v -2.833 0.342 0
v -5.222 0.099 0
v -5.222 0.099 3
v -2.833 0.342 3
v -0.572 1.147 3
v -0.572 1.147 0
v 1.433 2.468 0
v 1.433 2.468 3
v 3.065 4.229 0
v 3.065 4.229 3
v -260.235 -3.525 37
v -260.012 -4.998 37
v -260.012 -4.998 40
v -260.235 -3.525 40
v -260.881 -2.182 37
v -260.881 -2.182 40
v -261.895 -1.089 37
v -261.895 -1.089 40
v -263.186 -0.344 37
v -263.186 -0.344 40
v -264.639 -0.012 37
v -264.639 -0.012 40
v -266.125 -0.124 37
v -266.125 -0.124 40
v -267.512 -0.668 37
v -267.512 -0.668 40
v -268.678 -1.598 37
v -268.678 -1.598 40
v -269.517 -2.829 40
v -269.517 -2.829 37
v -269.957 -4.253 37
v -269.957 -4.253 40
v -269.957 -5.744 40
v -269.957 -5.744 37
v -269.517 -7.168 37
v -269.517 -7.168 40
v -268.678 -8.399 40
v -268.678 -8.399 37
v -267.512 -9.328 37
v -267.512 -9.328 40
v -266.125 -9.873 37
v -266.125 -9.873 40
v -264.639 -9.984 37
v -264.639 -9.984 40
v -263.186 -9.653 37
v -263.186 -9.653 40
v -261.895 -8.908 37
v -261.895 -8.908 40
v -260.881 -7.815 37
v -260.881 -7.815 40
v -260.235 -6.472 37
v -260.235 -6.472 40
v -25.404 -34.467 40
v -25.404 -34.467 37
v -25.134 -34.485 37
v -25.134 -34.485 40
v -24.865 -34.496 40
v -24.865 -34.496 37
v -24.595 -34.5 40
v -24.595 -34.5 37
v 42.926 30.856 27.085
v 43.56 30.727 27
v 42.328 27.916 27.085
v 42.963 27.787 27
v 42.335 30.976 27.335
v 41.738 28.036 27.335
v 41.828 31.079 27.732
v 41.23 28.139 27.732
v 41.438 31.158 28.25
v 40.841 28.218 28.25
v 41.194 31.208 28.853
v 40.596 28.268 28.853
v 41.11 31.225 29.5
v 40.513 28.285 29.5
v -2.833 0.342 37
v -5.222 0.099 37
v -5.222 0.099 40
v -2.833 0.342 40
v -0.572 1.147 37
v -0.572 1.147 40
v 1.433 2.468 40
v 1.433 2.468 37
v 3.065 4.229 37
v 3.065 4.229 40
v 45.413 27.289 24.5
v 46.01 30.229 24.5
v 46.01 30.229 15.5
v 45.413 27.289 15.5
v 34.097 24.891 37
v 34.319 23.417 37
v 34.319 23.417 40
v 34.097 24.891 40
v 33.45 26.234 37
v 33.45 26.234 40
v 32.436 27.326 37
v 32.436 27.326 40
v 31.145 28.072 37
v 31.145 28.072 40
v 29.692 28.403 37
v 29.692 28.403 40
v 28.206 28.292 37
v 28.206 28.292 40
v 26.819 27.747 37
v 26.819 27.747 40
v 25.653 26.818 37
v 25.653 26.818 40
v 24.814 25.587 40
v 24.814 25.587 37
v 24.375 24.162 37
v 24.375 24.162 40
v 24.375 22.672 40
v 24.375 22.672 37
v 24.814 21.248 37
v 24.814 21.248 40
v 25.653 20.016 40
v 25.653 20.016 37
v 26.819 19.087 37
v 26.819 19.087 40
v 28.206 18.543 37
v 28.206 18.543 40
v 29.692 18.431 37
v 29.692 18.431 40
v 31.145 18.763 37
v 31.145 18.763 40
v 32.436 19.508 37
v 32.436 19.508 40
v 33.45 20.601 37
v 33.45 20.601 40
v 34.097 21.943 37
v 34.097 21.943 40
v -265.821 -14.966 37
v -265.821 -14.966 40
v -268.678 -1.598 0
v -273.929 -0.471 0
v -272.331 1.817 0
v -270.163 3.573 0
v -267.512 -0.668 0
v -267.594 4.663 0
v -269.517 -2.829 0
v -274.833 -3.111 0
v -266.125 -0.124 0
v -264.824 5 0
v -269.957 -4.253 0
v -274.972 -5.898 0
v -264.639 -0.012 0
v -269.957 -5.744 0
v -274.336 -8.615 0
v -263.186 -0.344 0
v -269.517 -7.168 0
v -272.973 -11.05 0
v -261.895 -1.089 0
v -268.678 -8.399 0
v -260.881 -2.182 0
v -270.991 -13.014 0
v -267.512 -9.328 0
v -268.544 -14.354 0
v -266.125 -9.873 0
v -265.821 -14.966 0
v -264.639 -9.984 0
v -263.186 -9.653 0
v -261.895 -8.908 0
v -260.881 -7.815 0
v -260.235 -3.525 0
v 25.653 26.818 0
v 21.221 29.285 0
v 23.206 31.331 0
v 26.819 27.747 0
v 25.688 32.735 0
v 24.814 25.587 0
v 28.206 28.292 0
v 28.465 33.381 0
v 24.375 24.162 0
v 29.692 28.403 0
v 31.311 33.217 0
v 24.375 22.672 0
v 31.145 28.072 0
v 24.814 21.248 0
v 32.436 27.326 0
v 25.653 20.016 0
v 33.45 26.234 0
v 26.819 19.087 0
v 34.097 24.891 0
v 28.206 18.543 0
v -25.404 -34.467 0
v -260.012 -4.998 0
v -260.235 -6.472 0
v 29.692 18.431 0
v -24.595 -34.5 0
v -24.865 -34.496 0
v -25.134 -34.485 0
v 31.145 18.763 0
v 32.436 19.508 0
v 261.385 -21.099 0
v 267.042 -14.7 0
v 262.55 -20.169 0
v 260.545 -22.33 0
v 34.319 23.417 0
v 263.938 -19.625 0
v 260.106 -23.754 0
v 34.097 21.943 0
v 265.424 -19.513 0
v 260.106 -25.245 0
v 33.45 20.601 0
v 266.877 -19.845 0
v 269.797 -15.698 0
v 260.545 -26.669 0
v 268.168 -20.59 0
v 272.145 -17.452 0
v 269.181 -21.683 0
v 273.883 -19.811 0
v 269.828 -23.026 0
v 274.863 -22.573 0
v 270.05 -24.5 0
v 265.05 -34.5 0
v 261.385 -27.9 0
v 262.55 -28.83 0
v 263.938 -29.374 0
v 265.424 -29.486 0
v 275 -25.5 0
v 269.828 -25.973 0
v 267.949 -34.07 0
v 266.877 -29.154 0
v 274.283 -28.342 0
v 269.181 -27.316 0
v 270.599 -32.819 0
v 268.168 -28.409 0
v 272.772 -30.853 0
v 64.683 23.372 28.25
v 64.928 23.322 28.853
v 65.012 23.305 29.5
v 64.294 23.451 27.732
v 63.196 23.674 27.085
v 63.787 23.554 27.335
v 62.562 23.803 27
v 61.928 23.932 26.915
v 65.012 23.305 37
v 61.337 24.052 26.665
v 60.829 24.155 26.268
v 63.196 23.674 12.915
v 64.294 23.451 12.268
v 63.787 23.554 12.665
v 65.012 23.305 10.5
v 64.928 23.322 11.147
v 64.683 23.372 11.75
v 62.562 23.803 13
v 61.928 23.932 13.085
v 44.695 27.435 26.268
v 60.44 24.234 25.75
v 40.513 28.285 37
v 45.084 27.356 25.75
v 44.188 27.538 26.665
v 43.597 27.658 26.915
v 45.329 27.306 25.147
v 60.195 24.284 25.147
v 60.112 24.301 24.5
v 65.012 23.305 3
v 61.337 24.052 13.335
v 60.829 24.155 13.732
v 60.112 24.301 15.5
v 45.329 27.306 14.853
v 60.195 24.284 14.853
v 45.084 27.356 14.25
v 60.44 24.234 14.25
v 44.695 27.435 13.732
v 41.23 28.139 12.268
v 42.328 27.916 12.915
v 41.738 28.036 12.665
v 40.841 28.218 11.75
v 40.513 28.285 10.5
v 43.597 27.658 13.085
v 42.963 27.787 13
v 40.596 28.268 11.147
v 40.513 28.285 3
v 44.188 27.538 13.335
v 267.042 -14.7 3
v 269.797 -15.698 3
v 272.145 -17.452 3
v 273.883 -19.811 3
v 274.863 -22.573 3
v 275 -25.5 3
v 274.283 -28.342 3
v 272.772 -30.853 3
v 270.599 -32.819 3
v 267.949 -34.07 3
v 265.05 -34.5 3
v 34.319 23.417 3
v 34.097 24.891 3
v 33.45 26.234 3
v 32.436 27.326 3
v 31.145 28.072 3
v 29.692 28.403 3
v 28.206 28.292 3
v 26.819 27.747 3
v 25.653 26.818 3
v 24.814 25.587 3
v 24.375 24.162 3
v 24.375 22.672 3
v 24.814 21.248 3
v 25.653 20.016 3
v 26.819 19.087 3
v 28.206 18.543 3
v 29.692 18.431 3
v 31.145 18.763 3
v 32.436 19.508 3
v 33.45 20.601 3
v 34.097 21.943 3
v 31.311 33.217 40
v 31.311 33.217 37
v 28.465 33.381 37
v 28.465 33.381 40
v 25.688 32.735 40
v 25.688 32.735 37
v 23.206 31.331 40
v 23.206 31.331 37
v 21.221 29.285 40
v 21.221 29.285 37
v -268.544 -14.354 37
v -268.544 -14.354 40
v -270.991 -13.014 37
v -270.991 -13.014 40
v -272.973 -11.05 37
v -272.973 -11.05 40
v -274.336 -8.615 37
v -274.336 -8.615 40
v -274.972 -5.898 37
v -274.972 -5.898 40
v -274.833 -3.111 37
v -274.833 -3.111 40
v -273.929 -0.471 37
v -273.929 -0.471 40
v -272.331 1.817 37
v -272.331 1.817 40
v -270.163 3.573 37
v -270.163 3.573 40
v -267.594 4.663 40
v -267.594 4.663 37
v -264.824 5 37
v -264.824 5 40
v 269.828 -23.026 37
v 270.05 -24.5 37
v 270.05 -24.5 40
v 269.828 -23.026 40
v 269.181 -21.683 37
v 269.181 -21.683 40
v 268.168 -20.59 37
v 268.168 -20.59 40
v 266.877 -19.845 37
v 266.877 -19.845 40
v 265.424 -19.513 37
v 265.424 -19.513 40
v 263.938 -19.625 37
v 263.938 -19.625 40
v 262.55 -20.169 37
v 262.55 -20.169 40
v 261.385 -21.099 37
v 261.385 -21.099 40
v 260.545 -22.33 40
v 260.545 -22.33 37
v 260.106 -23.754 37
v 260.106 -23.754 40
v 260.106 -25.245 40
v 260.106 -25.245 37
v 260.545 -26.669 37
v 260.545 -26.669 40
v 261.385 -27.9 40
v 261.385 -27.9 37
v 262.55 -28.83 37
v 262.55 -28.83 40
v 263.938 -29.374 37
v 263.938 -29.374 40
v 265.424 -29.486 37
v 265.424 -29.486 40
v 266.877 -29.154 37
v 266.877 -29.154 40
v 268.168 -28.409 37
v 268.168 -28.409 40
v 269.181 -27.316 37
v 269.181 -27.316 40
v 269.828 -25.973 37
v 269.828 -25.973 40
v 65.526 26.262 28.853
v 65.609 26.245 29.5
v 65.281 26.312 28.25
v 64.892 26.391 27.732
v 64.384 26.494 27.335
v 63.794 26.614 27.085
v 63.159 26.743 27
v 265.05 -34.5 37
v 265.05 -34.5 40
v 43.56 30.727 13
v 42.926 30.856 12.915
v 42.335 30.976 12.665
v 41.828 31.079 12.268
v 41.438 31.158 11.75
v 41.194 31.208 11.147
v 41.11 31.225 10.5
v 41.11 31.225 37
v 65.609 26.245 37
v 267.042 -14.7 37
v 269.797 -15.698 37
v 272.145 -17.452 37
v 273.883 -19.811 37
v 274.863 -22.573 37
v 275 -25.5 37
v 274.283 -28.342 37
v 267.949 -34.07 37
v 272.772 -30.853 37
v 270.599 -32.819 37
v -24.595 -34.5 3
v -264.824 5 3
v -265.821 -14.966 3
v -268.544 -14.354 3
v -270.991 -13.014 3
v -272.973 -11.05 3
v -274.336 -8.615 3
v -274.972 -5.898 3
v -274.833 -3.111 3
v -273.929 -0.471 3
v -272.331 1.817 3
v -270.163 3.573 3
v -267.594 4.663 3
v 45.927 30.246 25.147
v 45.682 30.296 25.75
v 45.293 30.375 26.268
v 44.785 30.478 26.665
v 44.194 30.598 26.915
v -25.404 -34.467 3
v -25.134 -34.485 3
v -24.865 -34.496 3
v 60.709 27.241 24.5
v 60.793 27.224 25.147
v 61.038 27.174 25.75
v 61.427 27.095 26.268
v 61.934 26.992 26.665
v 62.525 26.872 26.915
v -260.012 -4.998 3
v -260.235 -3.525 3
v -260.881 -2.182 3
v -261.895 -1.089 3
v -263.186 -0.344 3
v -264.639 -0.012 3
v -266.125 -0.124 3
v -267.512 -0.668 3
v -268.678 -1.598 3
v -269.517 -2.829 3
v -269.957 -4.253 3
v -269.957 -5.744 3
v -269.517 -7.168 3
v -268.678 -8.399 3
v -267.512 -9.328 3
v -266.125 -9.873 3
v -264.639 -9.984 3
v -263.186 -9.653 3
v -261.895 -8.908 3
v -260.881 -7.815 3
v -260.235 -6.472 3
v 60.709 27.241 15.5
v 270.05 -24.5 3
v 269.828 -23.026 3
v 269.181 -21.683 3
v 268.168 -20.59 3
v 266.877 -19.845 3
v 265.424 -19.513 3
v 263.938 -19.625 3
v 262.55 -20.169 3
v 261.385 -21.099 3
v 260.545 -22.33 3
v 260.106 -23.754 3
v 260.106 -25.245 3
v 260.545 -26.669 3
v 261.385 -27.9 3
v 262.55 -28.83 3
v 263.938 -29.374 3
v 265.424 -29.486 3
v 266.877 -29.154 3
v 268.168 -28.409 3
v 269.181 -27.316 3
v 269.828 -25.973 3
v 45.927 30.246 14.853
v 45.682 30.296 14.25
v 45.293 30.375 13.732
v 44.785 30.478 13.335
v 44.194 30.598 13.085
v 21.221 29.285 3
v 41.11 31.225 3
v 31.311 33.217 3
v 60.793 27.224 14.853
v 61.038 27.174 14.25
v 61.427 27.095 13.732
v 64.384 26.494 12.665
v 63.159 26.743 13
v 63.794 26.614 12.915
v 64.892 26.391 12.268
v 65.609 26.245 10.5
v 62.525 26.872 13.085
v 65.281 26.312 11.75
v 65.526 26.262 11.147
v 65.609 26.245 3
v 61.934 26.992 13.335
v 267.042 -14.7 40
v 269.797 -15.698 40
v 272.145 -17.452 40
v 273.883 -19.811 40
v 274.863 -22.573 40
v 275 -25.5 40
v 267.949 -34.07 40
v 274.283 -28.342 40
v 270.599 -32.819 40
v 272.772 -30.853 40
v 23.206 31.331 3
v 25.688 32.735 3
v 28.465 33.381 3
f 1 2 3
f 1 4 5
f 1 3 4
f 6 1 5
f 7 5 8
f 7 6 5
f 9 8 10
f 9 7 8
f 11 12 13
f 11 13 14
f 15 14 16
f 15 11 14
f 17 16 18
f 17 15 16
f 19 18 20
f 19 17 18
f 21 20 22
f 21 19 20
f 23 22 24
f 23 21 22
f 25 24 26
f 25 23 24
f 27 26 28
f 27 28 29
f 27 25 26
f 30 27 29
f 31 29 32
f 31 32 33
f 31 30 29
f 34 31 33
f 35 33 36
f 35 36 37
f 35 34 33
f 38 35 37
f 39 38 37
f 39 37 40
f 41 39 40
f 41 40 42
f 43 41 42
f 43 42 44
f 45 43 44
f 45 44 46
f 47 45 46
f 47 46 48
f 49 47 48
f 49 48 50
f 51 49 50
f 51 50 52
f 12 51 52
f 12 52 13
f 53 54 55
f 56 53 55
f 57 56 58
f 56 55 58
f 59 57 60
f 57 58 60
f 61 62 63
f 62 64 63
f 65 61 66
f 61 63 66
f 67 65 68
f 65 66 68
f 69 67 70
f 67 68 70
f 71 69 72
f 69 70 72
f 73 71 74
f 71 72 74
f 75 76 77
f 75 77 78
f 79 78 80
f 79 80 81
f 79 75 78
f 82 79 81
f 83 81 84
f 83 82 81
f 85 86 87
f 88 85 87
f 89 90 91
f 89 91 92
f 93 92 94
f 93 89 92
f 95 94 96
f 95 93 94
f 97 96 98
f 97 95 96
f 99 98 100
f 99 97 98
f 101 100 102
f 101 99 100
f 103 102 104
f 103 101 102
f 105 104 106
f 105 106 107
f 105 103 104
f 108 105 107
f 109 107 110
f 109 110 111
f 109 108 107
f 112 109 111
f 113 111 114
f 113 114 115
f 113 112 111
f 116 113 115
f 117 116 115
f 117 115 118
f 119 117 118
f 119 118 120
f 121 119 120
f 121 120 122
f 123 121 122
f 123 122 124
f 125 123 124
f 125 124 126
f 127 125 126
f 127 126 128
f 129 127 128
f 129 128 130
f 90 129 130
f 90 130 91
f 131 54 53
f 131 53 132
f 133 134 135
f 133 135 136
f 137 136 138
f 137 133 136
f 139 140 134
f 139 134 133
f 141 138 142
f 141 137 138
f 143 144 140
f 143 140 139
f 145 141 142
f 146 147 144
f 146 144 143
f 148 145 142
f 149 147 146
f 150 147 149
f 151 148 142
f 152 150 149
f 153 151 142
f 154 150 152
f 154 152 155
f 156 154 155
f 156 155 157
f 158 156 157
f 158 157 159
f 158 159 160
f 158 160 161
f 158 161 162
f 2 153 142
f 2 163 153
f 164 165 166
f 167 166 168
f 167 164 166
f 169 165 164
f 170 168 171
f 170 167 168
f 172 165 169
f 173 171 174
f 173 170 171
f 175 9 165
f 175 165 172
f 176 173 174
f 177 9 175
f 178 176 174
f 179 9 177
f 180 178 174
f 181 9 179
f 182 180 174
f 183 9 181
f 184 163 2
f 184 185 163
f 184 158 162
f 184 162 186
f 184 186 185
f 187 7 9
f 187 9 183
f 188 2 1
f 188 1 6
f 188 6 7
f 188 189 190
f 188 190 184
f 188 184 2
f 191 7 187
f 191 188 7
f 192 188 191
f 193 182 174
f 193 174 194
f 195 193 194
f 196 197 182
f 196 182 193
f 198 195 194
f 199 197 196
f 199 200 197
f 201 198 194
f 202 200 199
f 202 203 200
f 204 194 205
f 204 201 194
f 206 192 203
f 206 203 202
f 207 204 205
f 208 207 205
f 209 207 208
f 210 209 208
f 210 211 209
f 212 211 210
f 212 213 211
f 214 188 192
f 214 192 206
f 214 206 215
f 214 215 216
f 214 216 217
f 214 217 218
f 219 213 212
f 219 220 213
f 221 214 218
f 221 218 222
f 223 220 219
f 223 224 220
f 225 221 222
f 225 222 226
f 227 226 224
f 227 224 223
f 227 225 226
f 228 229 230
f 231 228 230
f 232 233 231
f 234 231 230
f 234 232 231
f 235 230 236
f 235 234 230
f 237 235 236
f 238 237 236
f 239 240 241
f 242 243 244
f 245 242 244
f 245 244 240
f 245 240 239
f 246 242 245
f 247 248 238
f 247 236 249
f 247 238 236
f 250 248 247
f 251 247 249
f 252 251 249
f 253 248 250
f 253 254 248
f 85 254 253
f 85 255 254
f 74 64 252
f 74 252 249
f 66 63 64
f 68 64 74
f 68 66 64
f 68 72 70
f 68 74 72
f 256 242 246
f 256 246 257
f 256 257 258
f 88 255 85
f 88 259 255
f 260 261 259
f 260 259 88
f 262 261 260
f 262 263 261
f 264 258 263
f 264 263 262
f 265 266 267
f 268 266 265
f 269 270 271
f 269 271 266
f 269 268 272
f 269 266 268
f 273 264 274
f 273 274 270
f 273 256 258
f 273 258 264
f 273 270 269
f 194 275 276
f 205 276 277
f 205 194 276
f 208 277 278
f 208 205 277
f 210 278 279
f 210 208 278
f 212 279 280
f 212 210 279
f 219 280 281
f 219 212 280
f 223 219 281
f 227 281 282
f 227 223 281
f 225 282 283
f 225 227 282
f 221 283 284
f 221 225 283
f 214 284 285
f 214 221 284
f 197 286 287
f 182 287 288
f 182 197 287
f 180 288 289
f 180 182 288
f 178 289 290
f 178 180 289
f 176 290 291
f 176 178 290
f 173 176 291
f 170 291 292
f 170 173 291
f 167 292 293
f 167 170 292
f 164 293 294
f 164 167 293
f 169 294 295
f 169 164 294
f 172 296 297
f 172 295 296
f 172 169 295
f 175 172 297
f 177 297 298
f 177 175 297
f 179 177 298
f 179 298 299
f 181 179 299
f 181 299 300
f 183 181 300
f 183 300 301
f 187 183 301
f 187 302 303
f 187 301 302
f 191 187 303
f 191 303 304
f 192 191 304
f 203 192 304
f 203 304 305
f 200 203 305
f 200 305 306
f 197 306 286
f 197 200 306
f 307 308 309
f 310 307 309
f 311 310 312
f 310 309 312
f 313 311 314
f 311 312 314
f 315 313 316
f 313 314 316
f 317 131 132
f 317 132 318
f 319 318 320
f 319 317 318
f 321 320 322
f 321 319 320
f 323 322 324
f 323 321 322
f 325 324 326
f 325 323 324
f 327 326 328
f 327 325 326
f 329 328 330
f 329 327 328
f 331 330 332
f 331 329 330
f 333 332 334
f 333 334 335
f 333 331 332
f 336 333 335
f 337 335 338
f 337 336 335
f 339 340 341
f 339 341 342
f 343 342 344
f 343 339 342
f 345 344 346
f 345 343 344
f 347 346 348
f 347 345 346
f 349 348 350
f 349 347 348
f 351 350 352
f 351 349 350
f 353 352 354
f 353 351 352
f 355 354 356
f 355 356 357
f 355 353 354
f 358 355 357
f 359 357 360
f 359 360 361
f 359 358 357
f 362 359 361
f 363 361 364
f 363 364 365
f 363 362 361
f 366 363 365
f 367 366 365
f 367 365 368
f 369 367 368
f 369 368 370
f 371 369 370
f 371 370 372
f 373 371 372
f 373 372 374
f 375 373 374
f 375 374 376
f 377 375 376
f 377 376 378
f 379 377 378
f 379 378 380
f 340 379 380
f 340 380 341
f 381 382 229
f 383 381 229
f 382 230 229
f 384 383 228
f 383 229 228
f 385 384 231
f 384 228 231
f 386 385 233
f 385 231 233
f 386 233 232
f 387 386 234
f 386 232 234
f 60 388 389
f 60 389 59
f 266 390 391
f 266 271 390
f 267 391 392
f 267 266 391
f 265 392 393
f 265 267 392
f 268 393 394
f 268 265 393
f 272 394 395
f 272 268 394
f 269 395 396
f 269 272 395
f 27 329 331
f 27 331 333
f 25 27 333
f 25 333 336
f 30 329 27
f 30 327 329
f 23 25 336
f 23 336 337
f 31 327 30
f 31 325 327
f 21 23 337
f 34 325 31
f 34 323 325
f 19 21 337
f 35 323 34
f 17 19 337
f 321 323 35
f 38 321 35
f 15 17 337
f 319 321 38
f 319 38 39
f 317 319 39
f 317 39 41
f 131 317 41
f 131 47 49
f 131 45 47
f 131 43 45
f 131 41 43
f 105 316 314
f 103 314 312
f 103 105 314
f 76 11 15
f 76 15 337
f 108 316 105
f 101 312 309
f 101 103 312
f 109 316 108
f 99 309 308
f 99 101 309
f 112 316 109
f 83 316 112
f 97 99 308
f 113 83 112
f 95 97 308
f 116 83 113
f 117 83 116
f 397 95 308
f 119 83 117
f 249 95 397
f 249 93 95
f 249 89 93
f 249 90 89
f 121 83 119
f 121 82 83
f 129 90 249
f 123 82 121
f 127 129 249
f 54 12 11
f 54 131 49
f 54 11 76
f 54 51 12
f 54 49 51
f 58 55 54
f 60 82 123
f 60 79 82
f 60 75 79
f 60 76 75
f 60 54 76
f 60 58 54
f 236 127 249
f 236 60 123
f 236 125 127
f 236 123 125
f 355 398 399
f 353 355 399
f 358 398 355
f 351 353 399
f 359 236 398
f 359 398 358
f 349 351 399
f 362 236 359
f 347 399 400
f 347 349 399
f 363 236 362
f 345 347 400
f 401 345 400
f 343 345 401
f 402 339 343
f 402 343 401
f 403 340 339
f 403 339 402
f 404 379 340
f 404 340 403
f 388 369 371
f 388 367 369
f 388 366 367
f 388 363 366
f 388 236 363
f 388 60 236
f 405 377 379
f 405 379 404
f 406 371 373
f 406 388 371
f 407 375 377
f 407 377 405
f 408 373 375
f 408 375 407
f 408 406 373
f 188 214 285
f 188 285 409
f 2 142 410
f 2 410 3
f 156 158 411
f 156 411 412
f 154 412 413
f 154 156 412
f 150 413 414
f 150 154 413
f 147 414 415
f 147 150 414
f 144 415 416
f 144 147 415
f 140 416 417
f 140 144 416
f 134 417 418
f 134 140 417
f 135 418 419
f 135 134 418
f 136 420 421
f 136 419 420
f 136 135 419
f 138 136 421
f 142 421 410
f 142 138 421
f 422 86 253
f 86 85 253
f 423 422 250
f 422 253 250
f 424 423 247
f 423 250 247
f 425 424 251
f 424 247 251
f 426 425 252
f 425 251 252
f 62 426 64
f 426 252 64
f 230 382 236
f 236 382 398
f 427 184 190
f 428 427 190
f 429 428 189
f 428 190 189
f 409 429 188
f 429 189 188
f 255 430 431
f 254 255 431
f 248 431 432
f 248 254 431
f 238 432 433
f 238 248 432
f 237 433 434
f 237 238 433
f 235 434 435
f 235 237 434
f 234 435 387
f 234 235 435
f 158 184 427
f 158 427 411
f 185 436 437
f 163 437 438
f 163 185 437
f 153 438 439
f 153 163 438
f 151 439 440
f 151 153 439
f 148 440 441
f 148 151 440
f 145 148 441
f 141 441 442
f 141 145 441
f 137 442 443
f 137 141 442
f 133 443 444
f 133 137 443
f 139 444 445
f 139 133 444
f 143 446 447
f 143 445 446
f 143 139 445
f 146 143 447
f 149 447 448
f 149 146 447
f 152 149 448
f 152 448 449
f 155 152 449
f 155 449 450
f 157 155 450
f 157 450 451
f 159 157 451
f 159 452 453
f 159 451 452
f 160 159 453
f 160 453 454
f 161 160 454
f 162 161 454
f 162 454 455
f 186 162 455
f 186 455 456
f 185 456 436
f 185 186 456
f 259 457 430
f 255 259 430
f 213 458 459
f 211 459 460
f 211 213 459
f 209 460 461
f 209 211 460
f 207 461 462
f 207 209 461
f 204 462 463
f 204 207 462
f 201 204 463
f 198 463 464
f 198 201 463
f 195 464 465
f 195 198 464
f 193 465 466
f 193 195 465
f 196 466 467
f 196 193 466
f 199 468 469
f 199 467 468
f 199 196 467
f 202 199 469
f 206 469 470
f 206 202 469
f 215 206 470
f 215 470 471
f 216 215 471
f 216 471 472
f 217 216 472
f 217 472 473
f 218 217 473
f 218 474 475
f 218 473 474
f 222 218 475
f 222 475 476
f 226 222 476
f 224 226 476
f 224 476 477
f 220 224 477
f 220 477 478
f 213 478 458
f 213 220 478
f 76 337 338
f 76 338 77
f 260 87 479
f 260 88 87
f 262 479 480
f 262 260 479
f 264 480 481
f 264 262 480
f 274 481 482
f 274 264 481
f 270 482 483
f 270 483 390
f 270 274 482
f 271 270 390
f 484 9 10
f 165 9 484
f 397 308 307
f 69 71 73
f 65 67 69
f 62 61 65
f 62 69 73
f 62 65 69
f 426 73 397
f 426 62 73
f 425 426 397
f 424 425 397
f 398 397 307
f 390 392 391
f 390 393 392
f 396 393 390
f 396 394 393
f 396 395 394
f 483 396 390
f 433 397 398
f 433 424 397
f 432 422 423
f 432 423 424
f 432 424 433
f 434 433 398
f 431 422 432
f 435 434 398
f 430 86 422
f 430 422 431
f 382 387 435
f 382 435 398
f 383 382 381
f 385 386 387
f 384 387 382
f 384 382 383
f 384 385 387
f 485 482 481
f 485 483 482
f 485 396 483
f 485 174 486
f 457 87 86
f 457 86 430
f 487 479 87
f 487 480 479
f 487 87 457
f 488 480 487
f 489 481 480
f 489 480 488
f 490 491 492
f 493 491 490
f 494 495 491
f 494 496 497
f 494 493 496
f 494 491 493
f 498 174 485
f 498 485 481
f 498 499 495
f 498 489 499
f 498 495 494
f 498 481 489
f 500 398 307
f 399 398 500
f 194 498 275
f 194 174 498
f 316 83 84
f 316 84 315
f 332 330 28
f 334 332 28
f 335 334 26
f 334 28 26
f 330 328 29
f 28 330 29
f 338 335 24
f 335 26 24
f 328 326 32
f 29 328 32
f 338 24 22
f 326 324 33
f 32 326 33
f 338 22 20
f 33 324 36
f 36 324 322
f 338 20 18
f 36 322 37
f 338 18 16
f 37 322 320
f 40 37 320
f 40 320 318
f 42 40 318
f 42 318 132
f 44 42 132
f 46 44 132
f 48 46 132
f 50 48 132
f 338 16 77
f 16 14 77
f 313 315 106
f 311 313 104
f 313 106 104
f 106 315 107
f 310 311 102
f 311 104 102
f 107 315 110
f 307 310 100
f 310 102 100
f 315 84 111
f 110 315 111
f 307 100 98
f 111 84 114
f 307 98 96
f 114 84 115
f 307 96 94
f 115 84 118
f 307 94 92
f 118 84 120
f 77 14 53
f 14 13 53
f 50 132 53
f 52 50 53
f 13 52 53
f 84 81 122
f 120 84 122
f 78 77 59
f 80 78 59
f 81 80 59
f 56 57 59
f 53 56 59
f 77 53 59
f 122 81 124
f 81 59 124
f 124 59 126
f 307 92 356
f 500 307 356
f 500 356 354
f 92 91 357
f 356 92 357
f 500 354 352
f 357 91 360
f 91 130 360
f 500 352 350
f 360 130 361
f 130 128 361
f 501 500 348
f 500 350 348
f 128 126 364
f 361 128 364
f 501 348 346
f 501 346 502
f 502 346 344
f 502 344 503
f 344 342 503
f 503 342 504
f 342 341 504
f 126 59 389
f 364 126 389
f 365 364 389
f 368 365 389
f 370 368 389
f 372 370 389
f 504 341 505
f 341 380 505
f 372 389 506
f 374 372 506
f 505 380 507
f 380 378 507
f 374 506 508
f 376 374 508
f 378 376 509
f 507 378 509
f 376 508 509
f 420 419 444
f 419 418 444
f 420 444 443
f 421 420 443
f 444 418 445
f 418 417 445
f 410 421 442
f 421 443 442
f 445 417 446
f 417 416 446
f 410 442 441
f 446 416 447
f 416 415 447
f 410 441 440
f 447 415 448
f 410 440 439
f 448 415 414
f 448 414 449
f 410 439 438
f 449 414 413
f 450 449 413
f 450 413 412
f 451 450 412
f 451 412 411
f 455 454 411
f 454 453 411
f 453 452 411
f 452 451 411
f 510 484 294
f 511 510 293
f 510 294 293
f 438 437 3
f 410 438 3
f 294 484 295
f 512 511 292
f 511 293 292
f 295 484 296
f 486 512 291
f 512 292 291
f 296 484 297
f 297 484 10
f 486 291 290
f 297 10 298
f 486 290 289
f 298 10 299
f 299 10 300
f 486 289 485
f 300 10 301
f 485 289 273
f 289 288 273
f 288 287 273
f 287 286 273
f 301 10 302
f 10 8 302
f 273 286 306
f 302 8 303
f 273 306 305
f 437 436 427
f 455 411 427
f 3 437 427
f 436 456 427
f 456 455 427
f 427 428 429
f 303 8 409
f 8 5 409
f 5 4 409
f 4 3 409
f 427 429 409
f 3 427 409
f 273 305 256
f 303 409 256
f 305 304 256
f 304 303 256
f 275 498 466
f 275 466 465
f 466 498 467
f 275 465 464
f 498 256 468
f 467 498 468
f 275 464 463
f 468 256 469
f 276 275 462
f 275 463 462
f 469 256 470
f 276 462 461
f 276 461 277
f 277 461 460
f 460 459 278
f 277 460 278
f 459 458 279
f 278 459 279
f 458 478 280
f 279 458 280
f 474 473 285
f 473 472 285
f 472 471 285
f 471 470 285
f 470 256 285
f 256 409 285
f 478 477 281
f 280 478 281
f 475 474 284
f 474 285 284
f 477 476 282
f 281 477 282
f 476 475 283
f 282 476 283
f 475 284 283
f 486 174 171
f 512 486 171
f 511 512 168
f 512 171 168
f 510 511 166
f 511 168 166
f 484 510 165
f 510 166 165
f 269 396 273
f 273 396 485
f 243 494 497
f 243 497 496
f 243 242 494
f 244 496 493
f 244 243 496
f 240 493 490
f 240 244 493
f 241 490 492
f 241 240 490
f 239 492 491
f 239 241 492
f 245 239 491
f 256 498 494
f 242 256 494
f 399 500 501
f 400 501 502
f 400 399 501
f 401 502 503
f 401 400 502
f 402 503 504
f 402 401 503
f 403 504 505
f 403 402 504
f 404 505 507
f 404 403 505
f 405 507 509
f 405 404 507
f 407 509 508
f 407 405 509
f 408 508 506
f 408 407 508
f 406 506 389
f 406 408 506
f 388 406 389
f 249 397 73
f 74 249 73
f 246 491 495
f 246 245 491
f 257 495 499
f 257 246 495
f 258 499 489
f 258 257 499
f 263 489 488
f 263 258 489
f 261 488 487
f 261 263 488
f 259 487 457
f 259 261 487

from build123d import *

# Parameters (mm, degrees)
PROFILE_EXTRUDE_DEPTH        = 40
LIGHTNING_BOLT_FILLET_R      = 10
SHELL_CUT_REACH              = 291.378
SHELL_SKETCH_W               = 549.904110801
SHELL_SKETCH_H               = 34
HOLES_START                  = -40
HOLES_SKETCH_R               = 5
HOLES_CUT_DEPTH              = 40
BOWTIE_SUPPORT_EXTRUDE_DEPTH = 3
BOWTIE_SUPPORT_FILLET_R      = 2.5


# Some blends are built 0.0001 mm under size
with BuildPart() as part:
    # Profile Sketch → Profile Extrude (new body)
    with BuildSketch(Plane.XY):
        with BuildLine():
            Line((-25, -34.499500189), (-265.820932486, -14.965628235))
            ThreePointArc((-265.820932486, -14.965628235), (-275, -4.499500189), (-264.823685281, 4.999854285))
            Line((-264.823685281, 4.999854285), (0, 0))
            Line((0, 0), (25, 34.499500189))
            Line((25, 34.499500189), (267.042170119, -14.699900238))
            ThreePointArc((267.042170119, -14.699900238), (275, -25.500499811), (265.050226145, -34.499500189))
            Line((265.050226145, -34.499500189), (-25, -34.499500189))
        make_face()
    extrude(amount=PROFILE_EXTRUDE_DEPTH)

    # Lightning Bolt Fillet
    # the kernel refuses this fillet: 10 mm, written as the material it adds along each edge
    with BuildSketch(Plane(origin=(0, 0, 0), x_dir=(-0.9998218216369521, 0.0188765722144361, 0), z_dir=(0, 0, 1))) as lightning_bolt_fillet_piece_1:
        with BuildLine():
            CenterArc((LIGHTNING_BOLT_FILLET_R * 0.522262066694, -LIGHTNING_BOLT_FILLET_R), LIGHTNING_BOLT_FILLET_R, 90, 55.152715338)
            Line((-LIGHTNING_BOLT_FILLET_R * 0.298415868343, -LIGHTNING_BOLT_FILLET_R * 0.428608954443), (0, 0))
            Line((0, 0), (LIGHTNING_BOLT_FILLET_R * 0.522262066694, 0))
        make_face()
    extrude(amount=40)
    # the kernel refuses this fillet: 10 mm, written as the material it takes off along each edge
    with BuildSketch(Plane(origin=(25, 34.499500189, -16.099347603), x_dir=(0.9799599951405409, -0.19919439732118757, 0), z_dir=(0, 0, 1))) as lightning_bolt_fillet_2_piece_1:
        with BuildLine():
            CenterArc((LIGHTNING_BOLT_FILLET_R * 0.643973904117, -LIGHTNING_BOLT_FILLET_R), LIGHTNING_BOLT_FILLET_R, 90, 65.560956721)
            Line((-LIGHTNING_BOLT_FILLET_R * 0.266428041961, -LIGHTNING_BOLT_FILLET_R * 0.586275095532), (0, 0))
            Line((0, 0), (LIGHTNING_BOLT_FILLET_R * 0.643973904117, 0))
        make_face()
    extrude(amount=72.198695206, mode=Mode.SUBTRACT)
    with BuildSketch(Plane(origin=(-25, -34.499500189, -1.012258703), x_dir=(1, 0, 0), z_dir=(0, 0, 1))) as lightning_bolt_fillet_2_piece_2:
        with BuildLine():
            CenterArc((LIGHTNING_BOLT_FILLET_R * 0.0404903481386, LIGHTNING_BOLT_FILLET_R), LIGHTNING_BOLT_FILLET_R, 265.36268102, 4.63731898)
            Line((-LIGHTNING_BOLT_FILLET_R * 0.040357800163, LIGHTNING_BOLT_FILLET_R * 0.0032735696711), (0, 0))
            Line((0, 0), (LIGHTNING_BOLT_FILLET_R * 0.0404903481386, 0))
        make_face()
    extrude(amount=42.024517407, mode=Mode.SUBTRACT)

    # Shell Cut: up to this plane
    shell_cut_end = Plane(origin=(25, 34.499500189, 40), z_dir=(-0.19919439732118804, -0.9799599951405409, 0))
    # Shell Sketch → Shell Cut (cut, up to the surface)
    with BuildSketch(Plane(origin=(-2.943500576, -36.288584016, 0), x_dir=(0.996726430328903, -0.080848148301631, 0), z_dir=(-0.080848148301631, -0.996726430328903, 0)), mode=Mode.PRIVATE) as shell_cut_sk1:
        with Locations((1.211249587, 20)):
            Rectangle(SHELL_SKETCH_W, SHELL_SKETCH_H)
    shell_cut_tool1 = split(extrude(shell_cut_sk1.sketch, amount=-SHELL_CUT_REACH, mode=Mode.PRIVATE), bisect_by=shell_cut_end, keep=Keep.BOTH, mode=Mode.PRIVATE)
    add(shell_cut_tool1.solids().sort_by_distance((-1.736216, -36.386511, 20))[0], mode=Mode.SUBTRACT)


with BuildPart() as shell_cut_piece_1:
    # of the separate pieces the step leaves, piece 1, a body of its own (shell_cut_pieces)
    add(part.part.solids().sort_by_distance((3.06453365, 4.228995169, 37))[0])


with BuildPart() as shell_cut_piece_2:
    # of the separate pieces the step leaves, piece 2, a body of its own (shell_cut_pieces)
    add(part.part.solids().sort_by_distance((-5.221690109, 0.098585176, 0))[0])


with BuildPart() as holes_cut_tool:
    # Holes Sketch → Holes Cut (new body)
    with BuildSketch(Plane.XY.offset(40).offset(HOLES_START)):
        with Locations((-265.012451003, -4.998363931)):
            Circle(HOLES_SKETCH_R)
        with Locations((29.318742666, 23.4171403)):
            Circle(HOLES_SKETCH_R)
        with Locations((265.050226145, -24.499500189)):
            Circle(HOLES_SKETCH_R)
    extrude(amount=HOLES_CUT_DEPTH)


with BuildPart() as shell_cut_piece_1_1:
    add(shell_cut_piece_1.part)

    # Holes Cut: cut by holes_cut_tool
    add(holes_cut_tool.part, mode=Mode.SUBTRACT)



with BuildPart() as shell_cut_piece_2_1:
    add(shell_cut_piece_2.part)

    # Holes Cut: cut by holes_cut_tool
    add(holes_cut_tool.part, mode=Mode.SUBTRACT)


with BuildPart() as shell_cut_piece_1_2:
    add(shell_cut_piece_1_1.part)

    add(shell_cut_piece_2_1.part)  # Bowtie Support Extrude merges Shell Cut piece 2
    # Bowtie Support Sketch → Bowtie Support Extrude (add)
    with BuildSketch(Plane(origin=(7.726350286, 38.010678463, 0), x_dir=(0.9799599951405408, -0.1991943973211881, 0), z_dir=(0.1991943973211881, 0.9799599951405409, 0))):
        Polygon((39.066631772, -27), (39.066631772, -13), (34.066631772, -13), (34.066631772, -3), (39.066631772, -3), (54.066631772, -3), (59.066631772, -3), (59.066631772, -13), (54.066631772, -13), (54.066631772, -27), (59.066631772, -27), (59.066631772, -37), (54.066631772, -37), (39.066631772, -37), (34.066631772, -37), (34.066631772, -27), align=None)
    extrude(amount=-BOWTIE_SUPPORT_EXTRUDE_DEPTH)

    # Bowtie Support Fillet
    bowtie_support_fillet_edges = [shell_cut_piece_1_2.edges().sort_by_distance(p)[0] for p in [
        (60.410694898, 25.77096834, 13),
        (60.410694898, 25.77096834, 27),
        (45.711294971, 28.758884299, 13),
        (45.711294971, 28.758884299, 27),
    ]]
    fillet(bowtie_support_fillet_edges, radius=BOWTIE_SUPPORT_FILLET_R)
    bowtie_support_fillet_2_edges = [shell_cut_piece_1_2.edges().sort_by_distance(p)[0] for p in [
        (65.310494873, 24.774996353, 13),
        (65.310494873, 24.774996353, 27),
        (40.811494995, 29.754856286, 13),
        (40.811494995, 29.754856286, 27),
    ]]
    fillet(bowtie_support_fillet_2_edges, radius=BOWTIE_SUPPORT_FILLET_R - 0.0001)  # a hair under: the kernel refuses the full size


solid = shell_cut_piece_1_2.part
